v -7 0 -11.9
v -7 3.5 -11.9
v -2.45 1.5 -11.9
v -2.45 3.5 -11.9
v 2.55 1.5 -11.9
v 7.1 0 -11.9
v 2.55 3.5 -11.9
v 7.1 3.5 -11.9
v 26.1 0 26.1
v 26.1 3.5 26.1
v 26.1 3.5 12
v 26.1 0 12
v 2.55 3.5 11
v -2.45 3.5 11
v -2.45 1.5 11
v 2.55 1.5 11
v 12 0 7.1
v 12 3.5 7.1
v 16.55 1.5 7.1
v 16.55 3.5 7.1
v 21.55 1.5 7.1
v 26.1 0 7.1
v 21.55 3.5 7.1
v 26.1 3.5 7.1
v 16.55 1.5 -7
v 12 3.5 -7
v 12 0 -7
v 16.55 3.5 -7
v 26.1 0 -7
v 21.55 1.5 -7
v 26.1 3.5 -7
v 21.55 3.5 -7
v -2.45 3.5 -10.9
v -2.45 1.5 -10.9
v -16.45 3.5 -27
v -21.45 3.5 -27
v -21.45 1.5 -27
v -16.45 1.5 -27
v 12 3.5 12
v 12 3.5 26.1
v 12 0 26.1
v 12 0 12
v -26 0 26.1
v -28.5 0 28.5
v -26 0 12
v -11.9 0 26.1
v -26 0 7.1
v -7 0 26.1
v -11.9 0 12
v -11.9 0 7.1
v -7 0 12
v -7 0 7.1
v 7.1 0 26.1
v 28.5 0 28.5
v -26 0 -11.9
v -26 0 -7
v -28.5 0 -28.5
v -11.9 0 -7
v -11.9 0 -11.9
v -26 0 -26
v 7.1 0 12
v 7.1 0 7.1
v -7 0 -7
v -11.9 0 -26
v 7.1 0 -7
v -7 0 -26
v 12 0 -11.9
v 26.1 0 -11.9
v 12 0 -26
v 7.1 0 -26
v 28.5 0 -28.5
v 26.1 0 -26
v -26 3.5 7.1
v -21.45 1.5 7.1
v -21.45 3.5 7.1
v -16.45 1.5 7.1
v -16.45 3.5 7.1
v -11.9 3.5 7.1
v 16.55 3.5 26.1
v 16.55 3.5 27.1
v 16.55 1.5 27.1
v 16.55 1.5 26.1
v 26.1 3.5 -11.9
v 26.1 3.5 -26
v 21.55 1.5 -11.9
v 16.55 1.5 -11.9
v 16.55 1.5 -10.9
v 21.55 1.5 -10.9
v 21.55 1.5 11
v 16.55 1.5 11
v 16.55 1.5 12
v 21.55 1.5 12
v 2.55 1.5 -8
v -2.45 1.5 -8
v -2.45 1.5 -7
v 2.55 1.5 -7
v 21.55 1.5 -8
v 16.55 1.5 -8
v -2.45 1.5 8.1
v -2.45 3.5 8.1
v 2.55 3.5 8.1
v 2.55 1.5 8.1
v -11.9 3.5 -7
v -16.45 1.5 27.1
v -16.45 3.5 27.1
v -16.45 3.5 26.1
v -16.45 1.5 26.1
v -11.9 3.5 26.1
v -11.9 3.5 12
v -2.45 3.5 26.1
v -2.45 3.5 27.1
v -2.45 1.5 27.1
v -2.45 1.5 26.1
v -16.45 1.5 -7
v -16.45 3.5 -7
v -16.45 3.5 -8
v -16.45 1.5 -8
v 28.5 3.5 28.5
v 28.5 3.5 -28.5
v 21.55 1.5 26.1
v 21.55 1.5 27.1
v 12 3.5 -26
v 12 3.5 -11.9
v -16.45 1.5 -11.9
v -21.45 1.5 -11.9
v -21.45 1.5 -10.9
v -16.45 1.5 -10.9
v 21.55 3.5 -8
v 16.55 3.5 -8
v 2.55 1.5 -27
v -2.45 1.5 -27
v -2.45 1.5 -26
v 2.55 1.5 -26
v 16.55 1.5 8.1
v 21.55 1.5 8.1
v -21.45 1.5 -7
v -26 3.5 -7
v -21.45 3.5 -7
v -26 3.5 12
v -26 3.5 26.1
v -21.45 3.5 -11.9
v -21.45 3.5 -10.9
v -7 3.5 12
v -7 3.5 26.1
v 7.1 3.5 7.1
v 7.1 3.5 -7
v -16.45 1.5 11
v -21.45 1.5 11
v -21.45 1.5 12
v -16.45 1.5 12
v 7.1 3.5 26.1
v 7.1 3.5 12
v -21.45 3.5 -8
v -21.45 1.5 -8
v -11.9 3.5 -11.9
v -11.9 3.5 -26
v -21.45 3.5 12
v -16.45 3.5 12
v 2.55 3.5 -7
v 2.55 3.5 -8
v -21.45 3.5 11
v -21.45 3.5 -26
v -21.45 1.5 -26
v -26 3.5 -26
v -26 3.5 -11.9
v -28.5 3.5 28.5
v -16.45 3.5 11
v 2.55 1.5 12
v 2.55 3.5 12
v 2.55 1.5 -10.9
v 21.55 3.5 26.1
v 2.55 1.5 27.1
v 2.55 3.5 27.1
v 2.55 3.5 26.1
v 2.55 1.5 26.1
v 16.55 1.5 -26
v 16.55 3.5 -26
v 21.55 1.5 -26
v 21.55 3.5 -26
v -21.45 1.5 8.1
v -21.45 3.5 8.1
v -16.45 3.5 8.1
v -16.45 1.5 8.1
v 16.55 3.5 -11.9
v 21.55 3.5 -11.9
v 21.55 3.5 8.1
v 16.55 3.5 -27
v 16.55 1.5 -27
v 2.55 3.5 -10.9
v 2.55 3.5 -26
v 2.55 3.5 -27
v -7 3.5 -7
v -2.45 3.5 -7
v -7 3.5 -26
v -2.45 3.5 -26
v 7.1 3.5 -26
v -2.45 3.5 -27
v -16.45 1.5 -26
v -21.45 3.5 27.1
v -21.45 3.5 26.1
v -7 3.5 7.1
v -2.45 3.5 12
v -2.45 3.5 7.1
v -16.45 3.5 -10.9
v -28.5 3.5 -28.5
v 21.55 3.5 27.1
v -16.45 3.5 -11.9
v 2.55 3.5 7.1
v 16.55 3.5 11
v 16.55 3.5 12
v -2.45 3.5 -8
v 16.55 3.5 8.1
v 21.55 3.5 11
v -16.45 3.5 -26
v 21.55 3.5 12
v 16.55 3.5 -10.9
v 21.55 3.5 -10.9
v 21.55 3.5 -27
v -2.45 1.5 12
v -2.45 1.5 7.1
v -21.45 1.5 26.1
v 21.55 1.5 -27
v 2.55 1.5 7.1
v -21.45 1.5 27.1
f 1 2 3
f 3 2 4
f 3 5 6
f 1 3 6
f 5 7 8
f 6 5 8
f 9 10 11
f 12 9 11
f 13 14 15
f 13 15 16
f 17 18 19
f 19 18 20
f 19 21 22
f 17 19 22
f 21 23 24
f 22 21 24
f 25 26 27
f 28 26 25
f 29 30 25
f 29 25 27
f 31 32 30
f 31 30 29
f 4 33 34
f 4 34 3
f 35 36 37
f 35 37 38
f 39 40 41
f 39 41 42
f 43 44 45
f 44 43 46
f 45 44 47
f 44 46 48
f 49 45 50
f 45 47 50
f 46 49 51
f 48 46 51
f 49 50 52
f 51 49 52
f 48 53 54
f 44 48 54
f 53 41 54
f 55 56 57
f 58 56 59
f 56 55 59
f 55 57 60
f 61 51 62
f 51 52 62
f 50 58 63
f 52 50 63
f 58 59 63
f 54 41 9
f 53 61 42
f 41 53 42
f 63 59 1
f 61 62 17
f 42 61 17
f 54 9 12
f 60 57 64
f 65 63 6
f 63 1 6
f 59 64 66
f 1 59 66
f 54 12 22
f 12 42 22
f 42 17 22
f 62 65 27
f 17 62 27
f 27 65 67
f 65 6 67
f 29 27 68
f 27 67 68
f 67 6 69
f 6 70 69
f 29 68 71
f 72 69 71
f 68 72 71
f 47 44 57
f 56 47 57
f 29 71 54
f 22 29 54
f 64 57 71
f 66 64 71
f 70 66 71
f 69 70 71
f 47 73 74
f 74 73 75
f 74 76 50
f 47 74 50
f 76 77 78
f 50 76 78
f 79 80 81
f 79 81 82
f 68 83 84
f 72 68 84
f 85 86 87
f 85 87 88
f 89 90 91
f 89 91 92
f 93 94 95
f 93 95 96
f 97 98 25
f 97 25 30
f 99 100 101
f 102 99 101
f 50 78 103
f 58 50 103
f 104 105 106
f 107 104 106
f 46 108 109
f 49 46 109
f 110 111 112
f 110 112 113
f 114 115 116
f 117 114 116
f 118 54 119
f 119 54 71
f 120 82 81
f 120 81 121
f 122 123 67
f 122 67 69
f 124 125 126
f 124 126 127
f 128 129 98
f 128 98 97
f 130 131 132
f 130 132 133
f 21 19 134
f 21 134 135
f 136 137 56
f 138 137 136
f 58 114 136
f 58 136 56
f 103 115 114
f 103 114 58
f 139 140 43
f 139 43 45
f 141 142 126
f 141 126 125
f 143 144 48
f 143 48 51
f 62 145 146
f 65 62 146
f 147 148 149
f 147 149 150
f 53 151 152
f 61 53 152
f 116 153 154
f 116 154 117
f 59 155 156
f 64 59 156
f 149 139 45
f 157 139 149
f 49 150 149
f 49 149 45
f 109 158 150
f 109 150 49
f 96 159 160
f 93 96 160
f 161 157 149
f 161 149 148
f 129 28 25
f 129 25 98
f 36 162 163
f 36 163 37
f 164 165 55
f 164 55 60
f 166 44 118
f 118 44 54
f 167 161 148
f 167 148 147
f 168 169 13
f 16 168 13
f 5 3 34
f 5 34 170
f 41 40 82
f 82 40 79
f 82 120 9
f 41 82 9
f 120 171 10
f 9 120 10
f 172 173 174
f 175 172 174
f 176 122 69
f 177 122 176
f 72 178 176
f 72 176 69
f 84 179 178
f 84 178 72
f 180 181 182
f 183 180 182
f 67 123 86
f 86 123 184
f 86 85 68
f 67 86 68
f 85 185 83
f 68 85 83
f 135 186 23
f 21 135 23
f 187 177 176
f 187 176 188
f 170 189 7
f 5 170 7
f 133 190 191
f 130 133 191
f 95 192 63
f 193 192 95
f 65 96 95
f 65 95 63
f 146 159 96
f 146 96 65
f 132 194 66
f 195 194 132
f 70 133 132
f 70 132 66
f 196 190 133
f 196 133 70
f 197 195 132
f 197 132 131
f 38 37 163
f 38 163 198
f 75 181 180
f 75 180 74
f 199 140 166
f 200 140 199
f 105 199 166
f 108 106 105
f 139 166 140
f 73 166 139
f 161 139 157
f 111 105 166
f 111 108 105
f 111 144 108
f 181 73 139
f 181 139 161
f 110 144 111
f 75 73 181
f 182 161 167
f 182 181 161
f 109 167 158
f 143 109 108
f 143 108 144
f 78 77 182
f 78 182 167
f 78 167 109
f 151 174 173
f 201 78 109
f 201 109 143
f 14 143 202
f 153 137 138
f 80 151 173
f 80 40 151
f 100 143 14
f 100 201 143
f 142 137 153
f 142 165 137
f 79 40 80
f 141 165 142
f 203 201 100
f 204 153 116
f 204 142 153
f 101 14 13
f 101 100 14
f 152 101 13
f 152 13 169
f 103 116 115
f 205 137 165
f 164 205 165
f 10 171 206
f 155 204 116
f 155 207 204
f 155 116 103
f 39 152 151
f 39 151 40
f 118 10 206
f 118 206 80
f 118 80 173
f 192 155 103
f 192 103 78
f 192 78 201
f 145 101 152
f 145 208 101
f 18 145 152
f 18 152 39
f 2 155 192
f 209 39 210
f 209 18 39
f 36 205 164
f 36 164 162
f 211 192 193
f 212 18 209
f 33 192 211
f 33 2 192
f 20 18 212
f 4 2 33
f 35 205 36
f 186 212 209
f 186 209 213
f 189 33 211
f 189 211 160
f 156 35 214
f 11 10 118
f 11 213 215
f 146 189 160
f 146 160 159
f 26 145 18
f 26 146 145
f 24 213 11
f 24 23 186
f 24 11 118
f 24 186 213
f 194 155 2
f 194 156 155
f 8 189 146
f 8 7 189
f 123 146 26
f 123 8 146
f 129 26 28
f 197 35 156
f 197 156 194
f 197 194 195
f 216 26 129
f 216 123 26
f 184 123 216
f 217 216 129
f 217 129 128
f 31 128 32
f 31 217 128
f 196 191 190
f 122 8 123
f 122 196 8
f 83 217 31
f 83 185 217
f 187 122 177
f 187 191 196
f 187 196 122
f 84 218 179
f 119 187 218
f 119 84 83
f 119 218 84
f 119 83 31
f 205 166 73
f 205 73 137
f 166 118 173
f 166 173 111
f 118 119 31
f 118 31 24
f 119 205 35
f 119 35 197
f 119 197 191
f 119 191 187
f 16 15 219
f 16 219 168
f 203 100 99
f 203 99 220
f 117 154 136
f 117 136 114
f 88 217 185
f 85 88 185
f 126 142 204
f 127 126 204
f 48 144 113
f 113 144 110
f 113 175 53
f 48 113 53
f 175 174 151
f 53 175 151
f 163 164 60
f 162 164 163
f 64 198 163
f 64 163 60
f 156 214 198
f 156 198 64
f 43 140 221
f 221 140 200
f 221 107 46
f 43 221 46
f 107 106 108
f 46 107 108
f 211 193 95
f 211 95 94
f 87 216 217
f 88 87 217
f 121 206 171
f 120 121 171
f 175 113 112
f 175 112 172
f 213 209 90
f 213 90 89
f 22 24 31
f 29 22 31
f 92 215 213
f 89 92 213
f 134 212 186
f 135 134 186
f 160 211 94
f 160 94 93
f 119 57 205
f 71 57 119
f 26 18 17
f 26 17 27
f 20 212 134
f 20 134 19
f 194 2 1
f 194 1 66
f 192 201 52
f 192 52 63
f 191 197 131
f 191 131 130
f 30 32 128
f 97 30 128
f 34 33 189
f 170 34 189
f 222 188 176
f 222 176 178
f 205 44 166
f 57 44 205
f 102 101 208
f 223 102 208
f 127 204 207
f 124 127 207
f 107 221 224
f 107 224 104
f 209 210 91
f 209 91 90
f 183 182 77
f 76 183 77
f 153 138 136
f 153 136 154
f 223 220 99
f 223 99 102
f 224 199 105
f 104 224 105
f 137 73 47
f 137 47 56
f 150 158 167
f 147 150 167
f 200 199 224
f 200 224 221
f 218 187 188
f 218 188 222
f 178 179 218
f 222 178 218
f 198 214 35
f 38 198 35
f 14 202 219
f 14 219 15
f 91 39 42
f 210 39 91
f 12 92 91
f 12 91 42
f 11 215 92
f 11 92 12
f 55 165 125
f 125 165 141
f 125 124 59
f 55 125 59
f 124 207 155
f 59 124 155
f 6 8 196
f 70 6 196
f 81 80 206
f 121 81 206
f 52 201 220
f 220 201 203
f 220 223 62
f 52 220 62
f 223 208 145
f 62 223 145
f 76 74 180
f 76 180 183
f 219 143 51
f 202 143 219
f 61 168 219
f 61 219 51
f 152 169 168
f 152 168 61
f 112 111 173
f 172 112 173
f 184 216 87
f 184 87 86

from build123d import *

# Parameters (mm, degrees)
ESQUISSE2_W                     = 57
ESQUISSE2_H                     = 57
BOSS_EXTRU_1_DEPTH              = 3.5
ESQUISSE3_W                     = 14.1
ESQUISSE3_H                     = 14.1
ENL_V_MAT_EXTRU_1_DEPTH         = 3.5
ESQUISSE4_W                     = 5
ESQUISSE4_H                     = 2
ENL_V_MAT_EXTRU_2_DEPTH         = 2
R_P_TITION_LIN_AIRE1_COUNT      = 3
R_P_TITION_LIN_AIRE1_PITCH      = 19
R_P_TITION_LIN_AIRE1_COUNT_DIR2 = 3
R_P_TITION_LIN_AIRE1_PITCH_DIR2 = 19


with BuildPart() as part:
    # Esquisse2 → Boss.-Extru.1 (new body)
    with BuildSketch(Plane(origin=(0, 0, 0), x_dir=(1, 0, 0), z_dir=(0, 1, 0))):
        Rectangle(ESQUISSE2_W, ESQUISSE2_H)
    extrude(amount=BOSS_EXTRU_1_DEPTH)

    # Esquisse3 → Enlèv. mat.-Extru.1 (cut)
    with BuildSketch(Plane(origin=(0, 3.5, 0), x_dir=(1, 0, 0), z_dir=(0, 1, 0))):
        with Locations((-18.95, 18.95)):
            Rectangle(ESQUISSE3_W, ESQUISSE3_H)
    enl_v_mat_extru_1 = extrude(amount=-ENL_V_MAT_EXTRU_1_DEPTH, mode=Mode.SUBTRACT)

    # Esquisse4 → Enlèv. mat.-Extru.2 (cut)
    with BuildSketch(Plane(origin=(0, 3.5, 0), x_dir=(1, 0, 0), z_dir=(0, 1, 0))):
        with Locations((-18.95, 26)):
            Rectangle(ESQUISSE4_W, ESQUISSE4_H)
        with Locations((-18.95, 11.9)):
            Rectangle(ESQUISSE4_W, ESQUISSE4_H)
    enl_v_mat_extru_2 = extrude(amount=-ENL_V_MAT_EXTRU_2_DEPTH, mode=Mode.SUBTRACT)

    # Répétition linéaire1: Enlèv. mat.-Extru.1, Enl_v. mat.-Extru.2 3 × 3
    with Locations(*[(i * R_P_TITION_LIN_AIRE1_PITCH, 0, j * R_P_TITION_LIN_AIRE1_PITCH_DIR2) for i in range(R_P_TITION_LIN_AIRE1_COUNT) for j in range(R_P_TITION_LIN_AIRE1_COUNT_DIR2) if (i, j) != (0, 0)]):
        add(enl_v_mat_extru_1, mode=Mode.SUBTRACT)
        add(enl_v_mat_extru_2, mode=Mode.SUBTRACT)


solid = part.part
